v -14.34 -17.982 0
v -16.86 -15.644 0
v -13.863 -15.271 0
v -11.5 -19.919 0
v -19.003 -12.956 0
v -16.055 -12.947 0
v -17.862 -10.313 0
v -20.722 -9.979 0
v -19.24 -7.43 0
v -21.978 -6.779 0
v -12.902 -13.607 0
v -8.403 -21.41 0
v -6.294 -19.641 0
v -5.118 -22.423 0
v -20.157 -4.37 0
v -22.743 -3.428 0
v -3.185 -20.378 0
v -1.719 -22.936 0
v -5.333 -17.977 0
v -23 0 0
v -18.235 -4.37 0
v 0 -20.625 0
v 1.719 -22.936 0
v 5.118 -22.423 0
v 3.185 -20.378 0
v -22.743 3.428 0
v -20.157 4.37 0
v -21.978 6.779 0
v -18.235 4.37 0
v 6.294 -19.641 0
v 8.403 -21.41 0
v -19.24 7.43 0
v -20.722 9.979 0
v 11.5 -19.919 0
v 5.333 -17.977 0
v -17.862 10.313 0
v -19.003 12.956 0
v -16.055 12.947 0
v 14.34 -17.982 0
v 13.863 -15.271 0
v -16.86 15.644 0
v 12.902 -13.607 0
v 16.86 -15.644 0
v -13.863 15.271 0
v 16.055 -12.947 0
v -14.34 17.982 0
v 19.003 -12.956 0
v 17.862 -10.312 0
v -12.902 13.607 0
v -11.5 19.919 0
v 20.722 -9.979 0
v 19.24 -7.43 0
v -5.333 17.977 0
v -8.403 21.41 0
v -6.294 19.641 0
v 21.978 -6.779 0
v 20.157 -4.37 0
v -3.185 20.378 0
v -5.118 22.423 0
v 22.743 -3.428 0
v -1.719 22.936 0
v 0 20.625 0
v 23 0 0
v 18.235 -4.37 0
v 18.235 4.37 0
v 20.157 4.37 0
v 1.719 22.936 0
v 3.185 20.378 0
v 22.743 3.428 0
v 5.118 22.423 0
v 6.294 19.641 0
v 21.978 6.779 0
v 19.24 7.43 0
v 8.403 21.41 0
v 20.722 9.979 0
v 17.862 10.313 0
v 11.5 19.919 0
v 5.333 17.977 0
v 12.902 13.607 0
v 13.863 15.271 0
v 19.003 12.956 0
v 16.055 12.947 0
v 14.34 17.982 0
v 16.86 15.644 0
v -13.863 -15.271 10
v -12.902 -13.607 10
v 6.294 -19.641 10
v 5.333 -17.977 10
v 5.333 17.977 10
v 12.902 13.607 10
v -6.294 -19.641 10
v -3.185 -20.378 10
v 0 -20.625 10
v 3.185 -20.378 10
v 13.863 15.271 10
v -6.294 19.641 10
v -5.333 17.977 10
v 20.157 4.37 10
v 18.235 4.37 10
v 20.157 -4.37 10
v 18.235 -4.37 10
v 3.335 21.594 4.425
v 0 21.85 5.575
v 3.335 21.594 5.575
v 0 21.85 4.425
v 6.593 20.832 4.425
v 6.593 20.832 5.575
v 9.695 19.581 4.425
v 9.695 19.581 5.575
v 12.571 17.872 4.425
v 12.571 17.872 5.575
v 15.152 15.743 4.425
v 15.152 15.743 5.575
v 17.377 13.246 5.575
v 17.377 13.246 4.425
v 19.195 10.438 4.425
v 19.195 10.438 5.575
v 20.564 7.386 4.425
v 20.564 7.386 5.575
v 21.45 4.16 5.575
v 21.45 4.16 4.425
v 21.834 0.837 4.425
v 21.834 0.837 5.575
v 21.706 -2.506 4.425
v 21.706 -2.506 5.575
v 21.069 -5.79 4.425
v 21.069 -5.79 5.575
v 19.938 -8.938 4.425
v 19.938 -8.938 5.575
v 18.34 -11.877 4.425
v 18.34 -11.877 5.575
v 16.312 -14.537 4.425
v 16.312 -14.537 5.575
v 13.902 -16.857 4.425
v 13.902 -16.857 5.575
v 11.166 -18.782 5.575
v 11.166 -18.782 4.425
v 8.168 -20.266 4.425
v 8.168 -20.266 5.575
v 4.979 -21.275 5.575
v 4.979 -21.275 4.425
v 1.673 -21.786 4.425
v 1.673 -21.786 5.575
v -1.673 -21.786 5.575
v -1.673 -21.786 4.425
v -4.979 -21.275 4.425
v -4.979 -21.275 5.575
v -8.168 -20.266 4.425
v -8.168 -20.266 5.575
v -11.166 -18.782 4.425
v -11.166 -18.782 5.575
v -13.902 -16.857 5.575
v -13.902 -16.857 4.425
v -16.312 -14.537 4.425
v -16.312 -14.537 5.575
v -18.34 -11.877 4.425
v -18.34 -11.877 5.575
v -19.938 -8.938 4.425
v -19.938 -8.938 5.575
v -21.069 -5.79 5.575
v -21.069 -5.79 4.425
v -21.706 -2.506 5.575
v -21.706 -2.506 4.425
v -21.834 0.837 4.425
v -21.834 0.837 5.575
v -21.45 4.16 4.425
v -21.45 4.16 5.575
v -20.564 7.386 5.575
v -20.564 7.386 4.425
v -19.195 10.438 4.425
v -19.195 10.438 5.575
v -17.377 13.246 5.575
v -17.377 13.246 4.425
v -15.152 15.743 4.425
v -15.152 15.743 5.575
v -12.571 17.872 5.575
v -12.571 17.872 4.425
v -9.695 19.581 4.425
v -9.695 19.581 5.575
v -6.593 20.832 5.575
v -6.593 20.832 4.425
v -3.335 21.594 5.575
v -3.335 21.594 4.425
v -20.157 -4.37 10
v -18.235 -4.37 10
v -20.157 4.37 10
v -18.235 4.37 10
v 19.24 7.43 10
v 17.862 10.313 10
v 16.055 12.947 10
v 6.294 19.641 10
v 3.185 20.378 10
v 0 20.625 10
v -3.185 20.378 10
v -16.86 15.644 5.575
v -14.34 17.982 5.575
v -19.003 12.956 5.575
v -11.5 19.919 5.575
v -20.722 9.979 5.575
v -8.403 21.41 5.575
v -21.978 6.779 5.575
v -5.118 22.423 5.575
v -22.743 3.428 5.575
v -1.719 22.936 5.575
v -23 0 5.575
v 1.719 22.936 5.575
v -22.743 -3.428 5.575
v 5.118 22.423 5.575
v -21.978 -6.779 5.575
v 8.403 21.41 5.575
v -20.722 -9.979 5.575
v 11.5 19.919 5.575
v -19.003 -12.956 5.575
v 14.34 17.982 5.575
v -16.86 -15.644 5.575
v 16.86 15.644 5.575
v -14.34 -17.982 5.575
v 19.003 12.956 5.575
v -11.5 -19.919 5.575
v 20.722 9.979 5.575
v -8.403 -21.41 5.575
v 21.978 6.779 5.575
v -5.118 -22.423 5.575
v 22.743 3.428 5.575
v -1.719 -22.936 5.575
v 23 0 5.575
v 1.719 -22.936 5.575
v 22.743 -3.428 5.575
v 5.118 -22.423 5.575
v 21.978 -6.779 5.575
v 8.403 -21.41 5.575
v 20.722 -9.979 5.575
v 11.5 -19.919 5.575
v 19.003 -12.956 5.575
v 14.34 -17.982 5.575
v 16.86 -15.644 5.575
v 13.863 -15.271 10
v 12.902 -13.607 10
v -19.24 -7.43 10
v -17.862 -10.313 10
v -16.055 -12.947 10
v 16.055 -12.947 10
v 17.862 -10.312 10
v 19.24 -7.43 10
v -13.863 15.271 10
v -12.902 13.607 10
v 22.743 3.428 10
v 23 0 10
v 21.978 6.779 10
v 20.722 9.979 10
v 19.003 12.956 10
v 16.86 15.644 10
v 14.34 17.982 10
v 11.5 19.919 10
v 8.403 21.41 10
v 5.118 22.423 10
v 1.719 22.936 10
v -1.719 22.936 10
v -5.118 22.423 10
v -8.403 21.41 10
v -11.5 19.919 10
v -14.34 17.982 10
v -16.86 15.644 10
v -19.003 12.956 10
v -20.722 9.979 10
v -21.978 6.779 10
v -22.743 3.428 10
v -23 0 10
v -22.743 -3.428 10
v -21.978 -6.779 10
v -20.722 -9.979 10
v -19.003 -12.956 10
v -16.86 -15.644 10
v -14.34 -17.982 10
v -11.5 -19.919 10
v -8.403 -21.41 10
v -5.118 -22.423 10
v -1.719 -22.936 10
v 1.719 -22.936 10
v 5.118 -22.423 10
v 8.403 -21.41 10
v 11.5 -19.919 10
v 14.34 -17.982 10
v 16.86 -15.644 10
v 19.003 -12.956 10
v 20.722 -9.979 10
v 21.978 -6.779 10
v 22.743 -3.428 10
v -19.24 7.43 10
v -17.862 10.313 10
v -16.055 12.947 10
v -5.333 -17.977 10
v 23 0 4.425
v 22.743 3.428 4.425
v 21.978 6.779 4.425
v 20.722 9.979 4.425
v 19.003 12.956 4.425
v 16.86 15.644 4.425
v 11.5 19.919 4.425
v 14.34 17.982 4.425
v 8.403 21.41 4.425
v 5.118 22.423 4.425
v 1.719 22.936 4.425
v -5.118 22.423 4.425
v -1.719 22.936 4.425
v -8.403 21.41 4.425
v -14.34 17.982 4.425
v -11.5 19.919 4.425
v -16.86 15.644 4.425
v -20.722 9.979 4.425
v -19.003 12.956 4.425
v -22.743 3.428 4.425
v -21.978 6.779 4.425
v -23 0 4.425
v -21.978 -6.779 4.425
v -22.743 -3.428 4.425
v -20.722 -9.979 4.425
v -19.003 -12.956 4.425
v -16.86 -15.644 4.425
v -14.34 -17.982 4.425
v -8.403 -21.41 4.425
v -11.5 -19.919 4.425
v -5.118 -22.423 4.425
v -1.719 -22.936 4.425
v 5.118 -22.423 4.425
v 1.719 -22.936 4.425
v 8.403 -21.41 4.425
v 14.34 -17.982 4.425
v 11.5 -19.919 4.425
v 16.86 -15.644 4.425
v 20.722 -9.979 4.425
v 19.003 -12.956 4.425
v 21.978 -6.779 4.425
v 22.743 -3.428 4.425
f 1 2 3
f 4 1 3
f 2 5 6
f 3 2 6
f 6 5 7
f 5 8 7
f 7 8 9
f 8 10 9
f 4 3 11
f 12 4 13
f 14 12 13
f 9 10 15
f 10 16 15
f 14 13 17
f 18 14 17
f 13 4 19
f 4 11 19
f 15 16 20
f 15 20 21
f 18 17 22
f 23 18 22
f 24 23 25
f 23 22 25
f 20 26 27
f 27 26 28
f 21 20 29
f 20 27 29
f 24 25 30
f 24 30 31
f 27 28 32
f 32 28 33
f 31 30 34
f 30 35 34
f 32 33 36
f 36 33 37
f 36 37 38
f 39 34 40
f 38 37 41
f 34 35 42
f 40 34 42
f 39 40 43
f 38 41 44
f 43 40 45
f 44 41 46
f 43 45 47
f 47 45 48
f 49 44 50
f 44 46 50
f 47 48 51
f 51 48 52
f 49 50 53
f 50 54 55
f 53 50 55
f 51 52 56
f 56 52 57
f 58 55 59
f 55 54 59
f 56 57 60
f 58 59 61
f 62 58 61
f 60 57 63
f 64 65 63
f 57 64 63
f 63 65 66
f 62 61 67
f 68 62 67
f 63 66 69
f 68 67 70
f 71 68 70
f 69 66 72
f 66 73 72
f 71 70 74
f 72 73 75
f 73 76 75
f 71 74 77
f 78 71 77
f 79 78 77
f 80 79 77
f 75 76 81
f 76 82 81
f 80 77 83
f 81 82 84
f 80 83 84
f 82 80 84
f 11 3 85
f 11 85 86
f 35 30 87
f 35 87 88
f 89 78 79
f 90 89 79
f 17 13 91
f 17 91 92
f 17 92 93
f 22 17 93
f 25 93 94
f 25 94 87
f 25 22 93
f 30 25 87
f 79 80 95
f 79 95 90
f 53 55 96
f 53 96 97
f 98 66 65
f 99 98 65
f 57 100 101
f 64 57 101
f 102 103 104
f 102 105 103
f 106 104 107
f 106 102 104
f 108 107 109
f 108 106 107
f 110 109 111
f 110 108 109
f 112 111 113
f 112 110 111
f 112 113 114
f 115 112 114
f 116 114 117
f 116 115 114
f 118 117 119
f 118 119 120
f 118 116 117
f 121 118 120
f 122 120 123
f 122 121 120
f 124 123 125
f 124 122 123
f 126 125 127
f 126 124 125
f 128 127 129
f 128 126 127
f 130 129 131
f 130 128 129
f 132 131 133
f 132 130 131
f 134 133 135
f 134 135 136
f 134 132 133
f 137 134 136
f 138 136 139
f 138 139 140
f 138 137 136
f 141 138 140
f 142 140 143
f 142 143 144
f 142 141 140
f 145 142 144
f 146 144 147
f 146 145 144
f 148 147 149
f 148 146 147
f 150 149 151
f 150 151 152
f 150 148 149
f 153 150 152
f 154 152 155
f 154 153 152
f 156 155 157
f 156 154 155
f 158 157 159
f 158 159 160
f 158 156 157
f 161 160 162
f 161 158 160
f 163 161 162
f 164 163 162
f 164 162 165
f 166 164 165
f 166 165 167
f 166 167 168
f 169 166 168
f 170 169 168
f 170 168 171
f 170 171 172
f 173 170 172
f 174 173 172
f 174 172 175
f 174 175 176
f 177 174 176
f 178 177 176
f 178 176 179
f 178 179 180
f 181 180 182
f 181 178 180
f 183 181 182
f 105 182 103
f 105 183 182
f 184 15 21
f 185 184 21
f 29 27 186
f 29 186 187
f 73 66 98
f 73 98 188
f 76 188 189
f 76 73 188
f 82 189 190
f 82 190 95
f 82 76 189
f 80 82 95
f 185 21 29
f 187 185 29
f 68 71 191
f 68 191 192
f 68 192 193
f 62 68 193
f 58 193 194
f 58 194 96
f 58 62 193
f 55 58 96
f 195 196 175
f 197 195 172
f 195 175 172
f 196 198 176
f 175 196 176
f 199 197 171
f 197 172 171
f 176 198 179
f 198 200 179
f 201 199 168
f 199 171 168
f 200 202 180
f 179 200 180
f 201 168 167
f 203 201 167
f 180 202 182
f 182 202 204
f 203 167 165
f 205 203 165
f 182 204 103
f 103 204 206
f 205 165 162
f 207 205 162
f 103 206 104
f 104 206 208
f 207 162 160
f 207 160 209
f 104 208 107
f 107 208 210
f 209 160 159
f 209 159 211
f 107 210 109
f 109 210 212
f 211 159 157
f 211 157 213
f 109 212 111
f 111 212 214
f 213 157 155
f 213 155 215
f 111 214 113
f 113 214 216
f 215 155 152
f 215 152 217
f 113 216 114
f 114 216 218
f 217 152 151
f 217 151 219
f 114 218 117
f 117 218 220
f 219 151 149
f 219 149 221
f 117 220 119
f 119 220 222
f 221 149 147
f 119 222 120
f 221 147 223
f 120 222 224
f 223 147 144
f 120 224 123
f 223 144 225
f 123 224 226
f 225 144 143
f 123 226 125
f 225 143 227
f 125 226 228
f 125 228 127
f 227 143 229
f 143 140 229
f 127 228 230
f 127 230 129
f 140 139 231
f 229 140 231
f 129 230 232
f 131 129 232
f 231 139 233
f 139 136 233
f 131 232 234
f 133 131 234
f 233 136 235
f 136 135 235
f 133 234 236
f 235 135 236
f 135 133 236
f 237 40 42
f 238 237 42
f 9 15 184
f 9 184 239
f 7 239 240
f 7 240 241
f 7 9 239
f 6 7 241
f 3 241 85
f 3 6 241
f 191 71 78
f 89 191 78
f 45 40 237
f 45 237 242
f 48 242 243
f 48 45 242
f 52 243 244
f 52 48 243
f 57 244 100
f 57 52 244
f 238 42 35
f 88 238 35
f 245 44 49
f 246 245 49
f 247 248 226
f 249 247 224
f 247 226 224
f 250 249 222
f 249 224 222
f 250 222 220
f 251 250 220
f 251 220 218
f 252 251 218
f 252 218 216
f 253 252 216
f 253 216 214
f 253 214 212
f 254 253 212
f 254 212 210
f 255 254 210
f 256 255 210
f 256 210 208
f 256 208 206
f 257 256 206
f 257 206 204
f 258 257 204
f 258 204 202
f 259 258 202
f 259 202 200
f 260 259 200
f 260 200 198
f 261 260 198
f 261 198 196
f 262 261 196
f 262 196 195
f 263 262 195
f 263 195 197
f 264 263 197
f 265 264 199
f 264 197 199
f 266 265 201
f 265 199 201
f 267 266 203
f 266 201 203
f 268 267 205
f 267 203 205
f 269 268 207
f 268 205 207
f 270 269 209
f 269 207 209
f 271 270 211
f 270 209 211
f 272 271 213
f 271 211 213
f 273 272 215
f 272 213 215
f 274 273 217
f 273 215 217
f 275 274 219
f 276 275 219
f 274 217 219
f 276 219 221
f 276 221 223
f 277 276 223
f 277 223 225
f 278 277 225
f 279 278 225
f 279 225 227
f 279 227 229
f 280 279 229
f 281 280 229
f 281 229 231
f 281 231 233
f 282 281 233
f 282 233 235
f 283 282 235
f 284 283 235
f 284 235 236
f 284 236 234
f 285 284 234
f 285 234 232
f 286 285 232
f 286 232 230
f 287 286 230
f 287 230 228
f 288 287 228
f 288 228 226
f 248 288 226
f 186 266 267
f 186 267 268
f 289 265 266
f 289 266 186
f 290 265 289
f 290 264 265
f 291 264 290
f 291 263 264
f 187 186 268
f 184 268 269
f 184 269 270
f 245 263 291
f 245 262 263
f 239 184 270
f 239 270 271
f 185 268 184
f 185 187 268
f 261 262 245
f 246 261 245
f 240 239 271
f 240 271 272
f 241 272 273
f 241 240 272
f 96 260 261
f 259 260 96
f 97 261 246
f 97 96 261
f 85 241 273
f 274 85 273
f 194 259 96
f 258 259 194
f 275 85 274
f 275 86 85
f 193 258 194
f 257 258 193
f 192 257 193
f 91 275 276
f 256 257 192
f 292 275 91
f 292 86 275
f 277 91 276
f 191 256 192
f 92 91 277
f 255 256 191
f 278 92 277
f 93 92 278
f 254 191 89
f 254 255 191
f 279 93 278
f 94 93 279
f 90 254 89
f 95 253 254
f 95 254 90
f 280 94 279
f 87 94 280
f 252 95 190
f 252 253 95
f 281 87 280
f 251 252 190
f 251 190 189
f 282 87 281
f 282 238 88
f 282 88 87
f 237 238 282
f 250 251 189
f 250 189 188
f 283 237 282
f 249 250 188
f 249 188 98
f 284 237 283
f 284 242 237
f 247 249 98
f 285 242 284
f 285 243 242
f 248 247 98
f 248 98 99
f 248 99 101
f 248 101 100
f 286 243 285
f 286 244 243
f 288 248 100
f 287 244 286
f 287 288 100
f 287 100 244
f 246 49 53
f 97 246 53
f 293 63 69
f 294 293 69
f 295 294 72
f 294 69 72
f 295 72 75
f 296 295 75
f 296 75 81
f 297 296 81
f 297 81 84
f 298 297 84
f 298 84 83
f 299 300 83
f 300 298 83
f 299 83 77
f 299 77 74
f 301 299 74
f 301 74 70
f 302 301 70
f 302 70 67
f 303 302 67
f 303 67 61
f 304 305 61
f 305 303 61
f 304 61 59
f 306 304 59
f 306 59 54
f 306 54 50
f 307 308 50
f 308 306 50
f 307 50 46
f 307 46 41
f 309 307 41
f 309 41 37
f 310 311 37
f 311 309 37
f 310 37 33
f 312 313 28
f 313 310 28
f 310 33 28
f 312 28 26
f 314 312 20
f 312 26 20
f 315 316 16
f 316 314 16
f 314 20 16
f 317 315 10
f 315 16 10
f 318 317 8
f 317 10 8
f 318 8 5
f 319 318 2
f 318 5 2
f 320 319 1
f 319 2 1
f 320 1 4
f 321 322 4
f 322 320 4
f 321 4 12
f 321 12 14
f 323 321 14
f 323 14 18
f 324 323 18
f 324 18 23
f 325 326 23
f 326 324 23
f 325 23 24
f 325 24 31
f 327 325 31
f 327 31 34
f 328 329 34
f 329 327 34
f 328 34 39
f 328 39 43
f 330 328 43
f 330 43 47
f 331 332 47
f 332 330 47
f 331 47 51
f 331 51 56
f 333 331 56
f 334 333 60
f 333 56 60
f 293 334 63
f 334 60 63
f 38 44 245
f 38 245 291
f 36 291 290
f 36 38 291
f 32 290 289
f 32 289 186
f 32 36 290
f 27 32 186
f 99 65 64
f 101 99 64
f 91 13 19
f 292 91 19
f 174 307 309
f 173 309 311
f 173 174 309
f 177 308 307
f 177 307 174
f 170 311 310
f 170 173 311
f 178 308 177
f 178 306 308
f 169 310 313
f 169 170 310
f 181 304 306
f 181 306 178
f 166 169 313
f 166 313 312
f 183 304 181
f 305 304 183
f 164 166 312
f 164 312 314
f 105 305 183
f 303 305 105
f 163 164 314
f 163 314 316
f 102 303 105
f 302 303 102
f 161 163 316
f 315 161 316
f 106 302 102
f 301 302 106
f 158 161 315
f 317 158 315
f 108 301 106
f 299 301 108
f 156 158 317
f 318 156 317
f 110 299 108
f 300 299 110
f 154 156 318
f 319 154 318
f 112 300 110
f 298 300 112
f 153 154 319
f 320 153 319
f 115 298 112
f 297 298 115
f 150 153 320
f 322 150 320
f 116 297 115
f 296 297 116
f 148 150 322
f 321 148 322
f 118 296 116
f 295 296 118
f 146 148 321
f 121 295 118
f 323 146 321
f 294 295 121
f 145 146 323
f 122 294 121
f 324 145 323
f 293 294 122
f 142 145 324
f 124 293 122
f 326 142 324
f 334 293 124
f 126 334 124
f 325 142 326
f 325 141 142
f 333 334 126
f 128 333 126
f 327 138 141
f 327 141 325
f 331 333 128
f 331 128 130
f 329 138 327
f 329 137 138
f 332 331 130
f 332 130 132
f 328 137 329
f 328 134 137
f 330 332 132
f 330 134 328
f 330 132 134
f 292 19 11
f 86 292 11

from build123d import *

# Parameters (mm, degrees)
SKETCH2_R           = 23
SKETCH2_R_2         = 20.625
BOSS_EXTRUDE1_DEPTH = 10
SKETCH3_W           = 2.53
SKETCH3_H           = 8.74
BOSS_EXTRUDE2_DEPTH = 10
CIRPATTERN1_COUNT   = 6
SKETCH4_W           = 1.15
SKETCH4_H           = 2.3


with BuildPart() as part:
    # Sketch2 → Boss-Extrude1 (new body)
    with BuildSketch(Plane.XY):
        Circle(SKETCH2_R)
        Circle(SKETCH2_R_2, mode=Mode.SUBTRACT)
    extrude(amount=BOSS_EXTRUDE1_DEPTH)

    # Sketch3 → Boss-Extrude2 (add)
    with BuildSketch(Plane.XY):
        with Locations((-19.5, 0)):
            Rectangle(SKETCH3_W, SKETCH3_H)
    boss_extrude2 = extrude(amount=BOSS_EXTRUDE2_DEPTH)

    # CirPattern1: Boss-Extrude2 ×6 about axis
    cirpattern1_axis = Axis((0, 0, 0), (0, 0, 1))
    for i in range(1, CIRPATTERN1_COUNT):
        add(boss_extrude2.rotate(cirpattern1_axis, i * 360 / CIRPATTERN1_COUNT))

    # Sketch4 → Cut-Revolve1 (revolve, cut)
    with BuildSketch(Plane(origin=(0, 0, 0), x_dir=(0, 0, -1), z_dir=(1, 0, 0))):
        with Locations((-5, 23)):
            Rectangle(SKETCH4_W, SKETCH4_H)
    revolve(axis=Axis((0, 0, 10), (0, 0, -1)), mode=Mode.SUBTRACT)


solid = part.part
